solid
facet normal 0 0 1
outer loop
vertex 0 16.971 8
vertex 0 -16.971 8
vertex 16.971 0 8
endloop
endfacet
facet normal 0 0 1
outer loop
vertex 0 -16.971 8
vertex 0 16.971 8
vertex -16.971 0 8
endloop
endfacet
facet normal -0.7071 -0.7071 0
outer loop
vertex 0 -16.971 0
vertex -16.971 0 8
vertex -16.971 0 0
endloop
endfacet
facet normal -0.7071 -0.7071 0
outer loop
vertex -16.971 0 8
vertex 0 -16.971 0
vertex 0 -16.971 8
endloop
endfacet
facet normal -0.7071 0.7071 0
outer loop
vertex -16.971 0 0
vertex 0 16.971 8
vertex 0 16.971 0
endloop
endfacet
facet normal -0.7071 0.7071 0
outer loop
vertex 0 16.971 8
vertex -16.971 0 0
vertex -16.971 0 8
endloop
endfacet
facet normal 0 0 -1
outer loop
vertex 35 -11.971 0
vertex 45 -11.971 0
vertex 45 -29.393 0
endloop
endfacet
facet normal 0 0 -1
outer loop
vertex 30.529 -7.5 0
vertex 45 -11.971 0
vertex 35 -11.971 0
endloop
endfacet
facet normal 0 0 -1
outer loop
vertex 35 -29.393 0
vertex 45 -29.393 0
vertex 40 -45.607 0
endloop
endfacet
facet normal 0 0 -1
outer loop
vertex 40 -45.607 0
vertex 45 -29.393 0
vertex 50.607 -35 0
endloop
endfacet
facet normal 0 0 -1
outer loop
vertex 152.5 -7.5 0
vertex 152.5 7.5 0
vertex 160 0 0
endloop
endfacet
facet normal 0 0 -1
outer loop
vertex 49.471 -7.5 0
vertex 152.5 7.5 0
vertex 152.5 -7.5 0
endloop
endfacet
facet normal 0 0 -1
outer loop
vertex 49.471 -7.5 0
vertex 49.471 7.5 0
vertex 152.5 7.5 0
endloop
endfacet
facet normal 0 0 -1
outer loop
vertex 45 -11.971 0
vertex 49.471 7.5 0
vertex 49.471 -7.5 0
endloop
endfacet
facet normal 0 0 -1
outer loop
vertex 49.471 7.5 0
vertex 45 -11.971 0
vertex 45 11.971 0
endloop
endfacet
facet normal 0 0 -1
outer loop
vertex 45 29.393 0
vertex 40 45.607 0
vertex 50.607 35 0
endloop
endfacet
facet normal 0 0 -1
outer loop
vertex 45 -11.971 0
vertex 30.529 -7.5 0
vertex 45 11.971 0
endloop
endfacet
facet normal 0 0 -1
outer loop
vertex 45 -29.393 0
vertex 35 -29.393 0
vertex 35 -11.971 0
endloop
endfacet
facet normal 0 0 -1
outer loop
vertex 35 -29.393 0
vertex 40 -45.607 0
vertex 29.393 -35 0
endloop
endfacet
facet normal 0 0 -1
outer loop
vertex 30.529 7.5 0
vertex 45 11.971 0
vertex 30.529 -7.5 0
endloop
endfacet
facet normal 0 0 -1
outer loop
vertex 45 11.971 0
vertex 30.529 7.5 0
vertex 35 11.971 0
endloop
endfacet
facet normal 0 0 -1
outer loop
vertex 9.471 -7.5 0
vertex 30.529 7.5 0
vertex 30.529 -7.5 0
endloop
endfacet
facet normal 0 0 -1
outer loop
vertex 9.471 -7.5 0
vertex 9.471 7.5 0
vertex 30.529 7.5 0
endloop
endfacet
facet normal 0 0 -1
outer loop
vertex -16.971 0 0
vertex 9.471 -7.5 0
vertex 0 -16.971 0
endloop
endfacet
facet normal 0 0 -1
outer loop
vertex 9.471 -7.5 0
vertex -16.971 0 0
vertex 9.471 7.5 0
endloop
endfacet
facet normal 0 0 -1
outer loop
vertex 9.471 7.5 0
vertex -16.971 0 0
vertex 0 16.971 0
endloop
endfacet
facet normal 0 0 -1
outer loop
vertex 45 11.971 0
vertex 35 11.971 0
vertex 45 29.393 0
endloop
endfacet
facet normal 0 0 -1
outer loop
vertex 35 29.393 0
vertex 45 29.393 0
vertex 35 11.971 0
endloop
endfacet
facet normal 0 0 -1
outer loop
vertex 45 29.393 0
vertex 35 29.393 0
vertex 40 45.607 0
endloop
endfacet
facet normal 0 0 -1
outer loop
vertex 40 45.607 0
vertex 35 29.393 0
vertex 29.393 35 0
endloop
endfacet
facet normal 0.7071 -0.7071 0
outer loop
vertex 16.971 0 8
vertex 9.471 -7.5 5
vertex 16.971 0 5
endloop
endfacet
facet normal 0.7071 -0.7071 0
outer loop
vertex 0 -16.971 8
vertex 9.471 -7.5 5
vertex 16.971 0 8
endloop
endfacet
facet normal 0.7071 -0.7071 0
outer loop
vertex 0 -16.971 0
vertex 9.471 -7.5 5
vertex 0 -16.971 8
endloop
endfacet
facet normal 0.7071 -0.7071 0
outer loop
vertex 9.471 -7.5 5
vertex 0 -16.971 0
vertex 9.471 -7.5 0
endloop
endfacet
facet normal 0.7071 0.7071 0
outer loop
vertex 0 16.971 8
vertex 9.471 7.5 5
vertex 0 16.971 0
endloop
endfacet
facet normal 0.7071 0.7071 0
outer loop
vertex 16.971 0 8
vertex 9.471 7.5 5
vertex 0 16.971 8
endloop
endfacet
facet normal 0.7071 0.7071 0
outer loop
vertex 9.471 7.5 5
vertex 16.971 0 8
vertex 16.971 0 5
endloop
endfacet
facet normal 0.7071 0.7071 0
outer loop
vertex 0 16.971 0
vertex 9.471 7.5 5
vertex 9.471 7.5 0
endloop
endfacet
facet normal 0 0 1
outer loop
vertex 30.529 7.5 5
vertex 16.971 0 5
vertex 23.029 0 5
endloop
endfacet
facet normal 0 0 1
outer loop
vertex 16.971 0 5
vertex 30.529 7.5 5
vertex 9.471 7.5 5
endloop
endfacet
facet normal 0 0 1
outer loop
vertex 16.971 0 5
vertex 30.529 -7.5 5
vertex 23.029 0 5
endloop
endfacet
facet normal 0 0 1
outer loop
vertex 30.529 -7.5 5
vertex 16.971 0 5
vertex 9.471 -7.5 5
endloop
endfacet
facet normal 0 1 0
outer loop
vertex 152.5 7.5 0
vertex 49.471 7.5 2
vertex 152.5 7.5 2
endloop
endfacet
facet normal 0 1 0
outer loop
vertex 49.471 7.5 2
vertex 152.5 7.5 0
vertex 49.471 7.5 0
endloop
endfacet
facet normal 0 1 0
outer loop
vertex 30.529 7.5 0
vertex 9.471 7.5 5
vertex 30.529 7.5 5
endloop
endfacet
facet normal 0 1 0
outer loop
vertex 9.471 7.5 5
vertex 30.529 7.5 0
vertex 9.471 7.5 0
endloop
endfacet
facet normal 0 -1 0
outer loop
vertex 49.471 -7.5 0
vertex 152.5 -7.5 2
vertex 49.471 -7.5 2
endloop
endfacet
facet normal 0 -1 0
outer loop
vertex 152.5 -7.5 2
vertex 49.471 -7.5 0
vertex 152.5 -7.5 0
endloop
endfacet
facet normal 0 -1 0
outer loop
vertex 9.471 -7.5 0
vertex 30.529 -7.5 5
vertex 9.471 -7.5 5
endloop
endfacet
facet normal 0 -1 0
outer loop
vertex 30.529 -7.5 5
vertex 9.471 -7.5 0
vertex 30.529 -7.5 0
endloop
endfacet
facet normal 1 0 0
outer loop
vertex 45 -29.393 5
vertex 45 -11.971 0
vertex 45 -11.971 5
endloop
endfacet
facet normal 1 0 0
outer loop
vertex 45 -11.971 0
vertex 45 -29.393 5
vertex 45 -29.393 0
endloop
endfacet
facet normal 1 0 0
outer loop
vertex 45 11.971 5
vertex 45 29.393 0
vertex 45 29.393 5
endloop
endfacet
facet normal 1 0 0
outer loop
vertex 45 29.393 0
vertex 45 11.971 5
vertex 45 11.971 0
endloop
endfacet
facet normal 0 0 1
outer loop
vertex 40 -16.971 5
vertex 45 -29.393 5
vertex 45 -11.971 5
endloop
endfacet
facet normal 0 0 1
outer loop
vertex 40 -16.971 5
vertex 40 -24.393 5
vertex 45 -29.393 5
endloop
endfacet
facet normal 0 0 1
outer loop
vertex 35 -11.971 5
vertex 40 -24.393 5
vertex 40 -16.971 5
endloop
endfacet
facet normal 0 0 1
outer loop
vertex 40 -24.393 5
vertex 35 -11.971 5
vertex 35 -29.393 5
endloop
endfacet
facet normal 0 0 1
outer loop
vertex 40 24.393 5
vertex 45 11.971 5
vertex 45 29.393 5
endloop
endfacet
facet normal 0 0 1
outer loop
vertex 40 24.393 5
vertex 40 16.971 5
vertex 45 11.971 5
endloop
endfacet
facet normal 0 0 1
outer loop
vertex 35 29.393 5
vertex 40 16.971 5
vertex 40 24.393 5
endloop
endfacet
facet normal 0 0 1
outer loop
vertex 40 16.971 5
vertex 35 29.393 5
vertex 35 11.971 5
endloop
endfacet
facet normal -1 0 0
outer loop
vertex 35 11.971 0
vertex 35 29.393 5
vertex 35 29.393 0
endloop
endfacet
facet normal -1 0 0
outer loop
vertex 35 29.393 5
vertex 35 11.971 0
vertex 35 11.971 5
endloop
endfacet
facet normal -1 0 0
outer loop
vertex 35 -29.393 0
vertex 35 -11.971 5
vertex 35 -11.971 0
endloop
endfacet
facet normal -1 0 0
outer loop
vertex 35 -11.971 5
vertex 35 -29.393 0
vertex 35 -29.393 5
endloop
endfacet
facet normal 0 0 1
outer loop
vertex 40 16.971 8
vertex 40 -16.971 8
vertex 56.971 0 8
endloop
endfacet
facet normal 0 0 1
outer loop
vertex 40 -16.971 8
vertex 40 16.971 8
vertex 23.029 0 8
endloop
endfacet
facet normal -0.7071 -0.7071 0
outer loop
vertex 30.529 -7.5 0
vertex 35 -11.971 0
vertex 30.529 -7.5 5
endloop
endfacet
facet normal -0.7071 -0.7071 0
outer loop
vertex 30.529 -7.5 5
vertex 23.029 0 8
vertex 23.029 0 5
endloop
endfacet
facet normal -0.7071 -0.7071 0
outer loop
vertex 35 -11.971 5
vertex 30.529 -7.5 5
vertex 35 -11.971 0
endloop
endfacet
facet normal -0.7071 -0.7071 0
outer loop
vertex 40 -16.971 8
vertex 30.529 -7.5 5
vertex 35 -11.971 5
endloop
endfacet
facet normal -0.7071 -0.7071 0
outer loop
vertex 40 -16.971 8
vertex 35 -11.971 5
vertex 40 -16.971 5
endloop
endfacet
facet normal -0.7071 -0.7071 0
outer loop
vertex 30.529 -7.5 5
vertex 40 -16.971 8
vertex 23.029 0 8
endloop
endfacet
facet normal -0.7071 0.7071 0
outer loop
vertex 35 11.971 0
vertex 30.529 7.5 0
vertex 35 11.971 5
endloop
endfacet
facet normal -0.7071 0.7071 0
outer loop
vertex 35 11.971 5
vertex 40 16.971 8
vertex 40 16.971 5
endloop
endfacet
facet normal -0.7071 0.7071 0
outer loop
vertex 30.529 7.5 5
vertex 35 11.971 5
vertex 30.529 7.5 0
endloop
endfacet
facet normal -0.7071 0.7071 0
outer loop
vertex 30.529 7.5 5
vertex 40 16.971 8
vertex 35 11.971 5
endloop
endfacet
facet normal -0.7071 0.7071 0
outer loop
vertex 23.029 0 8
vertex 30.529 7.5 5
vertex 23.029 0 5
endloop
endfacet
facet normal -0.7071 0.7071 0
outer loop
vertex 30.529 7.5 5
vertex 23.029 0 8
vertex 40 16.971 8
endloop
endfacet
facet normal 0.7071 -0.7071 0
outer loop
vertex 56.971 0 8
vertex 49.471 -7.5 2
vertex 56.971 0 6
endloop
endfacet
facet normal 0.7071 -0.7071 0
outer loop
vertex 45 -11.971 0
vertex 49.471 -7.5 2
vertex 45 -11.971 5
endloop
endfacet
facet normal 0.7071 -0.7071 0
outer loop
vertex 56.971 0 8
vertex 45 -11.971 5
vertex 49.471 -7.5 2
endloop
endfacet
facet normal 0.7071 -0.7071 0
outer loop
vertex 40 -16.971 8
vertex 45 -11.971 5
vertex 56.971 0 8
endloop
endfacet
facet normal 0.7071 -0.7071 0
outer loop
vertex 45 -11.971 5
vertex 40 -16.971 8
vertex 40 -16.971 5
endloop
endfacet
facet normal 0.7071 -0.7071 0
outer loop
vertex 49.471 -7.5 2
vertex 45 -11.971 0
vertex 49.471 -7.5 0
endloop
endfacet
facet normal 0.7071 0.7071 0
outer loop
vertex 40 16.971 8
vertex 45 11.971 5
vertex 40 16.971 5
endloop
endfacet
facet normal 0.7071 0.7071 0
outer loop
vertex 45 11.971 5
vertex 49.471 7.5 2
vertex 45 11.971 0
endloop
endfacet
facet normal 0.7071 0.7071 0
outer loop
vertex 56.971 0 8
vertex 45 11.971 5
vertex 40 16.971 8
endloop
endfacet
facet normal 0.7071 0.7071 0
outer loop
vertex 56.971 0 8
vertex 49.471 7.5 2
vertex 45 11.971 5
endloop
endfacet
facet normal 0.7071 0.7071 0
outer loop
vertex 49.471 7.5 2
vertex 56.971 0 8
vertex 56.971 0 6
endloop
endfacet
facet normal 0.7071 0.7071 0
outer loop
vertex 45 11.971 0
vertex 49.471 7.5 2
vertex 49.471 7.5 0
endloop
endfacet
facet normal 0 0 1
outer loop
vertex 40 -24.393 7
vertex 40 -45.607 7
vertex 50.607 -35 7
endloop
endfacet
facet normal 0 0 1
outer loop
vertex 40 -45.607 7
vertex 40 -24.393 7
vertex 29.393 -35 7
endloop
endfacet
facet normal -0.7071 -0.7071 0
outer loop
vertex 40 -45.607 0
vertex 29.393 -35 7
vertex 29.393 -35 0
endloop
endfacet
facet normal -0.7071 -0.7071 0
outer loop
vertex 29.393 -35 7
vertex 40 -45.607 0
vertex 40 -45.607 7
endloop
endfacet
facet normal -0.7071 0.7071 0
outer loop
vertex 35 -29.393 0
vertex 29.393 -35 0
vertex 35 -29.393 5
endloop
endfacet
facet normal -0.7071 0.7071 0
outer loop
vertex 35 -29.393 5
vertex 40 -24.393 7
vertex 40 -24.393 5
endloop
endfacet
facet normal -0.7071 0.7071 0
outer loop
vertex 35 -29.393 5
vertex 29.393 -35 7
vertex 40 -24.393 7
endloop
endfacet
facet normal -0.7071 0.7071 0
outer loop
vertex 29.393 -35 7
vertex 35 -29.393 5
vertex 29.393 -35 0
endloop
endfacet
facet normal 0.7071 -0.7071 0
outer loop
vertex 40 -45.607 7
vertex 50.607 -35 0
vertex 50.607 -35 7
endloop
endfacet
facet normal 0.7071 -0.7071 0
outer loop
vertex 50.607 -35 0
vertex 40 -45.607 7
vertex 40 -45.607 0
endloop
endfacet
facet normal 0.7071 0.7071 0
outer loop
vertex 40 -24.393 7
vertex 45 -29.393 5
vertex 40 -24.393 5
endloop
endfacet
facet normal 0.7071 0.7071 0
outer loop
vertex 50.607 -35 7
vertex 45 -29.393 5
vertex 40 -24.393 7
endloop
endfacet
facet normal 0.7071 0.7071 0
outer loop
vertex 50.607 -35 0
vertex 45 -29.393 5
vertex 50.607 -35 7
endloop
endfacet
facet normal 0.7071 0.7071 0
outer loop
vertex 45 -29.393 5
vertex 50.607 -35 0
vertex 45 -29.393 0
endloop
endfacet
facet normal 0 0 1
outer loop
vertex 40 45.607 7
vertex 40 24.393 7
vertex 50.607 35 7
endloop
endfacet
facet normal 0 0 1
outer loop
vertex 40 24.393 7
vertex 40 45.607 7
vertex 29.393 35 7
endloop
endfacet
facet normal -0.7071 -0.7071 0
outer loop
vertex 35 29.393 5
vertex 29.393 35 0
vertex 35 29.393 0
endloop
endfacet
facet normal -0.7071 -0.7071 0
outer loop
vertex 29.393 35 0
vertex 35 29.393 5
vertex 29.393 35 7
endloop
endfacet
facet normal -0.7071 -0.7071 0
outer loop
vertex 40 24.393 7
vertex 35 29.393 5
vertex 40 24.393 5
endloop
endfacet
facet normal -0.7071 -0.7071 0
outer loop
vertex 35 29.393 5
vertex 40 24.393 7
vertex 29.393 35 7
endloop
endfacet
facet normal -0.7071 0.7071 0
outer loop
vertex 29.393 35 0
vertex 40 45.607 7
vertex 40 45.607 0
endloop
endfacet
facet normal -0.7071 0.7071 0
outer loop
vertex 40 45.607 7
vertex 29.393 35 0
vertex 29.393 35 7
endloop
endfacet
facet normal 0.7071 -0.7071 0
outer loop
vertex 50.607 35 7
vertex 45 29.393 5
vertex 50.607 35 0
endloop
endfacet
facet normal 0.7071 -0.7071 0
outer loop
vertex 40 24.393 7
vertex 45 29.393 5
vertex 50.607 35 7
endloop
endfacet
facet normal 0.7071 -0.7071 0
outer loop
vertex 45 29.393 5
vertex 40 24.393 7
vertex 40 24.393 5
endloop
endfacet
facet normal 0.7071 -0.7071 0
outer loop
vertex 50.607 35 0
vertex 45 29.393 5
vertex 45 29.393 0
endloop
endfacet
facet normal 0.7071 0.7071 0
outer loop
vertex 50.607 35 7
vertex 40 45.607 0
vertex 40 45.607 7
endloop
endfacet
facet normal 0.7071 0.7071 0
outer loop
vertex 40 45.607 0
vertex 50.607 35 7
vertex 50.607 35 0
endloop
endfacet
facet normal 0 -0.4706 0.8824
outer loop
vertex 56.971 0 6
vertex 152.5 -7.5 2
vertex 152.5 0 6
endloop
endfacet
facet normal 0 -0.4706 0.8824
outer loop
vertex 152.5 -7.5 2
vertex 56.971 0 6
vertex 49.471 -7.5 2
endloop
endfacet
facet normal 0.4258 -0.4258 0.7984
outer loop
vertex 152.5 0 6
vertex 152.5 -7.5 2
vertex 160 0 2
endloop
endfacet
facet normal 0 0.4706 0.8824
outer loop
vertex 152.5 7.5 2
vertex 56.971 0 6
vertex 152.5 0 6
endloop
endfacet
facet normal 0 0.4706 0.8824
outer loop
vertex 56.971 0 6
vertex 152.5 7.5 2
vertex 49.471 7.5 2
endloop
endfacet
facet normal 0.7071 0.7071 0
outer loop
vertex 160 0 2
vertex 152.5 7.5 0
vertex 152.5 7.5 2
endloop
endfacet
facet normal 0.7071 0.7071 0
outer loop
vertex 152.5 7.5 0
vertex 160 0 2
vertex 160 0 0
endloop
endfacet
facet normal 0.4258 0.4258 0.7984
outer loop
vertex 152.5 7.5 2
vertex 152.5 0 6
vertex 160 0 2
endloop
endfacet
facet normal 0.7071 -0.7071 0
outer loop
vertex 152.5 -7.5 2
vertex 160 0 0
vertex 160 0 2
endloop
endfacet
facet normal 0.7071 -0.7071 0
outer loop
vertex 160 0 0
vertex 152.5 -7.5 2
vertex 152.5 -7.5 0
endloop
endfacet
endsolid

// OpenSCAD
large_decoration_height = 8; //[0:30]
small_decoration_height = 7; //[0:30]
large_decoration_width = 24; //[10:40]
small_decoration_width = 15; //[7:35]
handle_width = 15; //[5:25]
hilt_width = 10; //[5:25]
hilt_length = 70; //[30:130]
handle_height = 5; //[0:30]
blade_length = 120; //[20:250]
blade_side_height = 2; //[0:30]
blade_center_height = 6; //[0:30]

// preview[view:south west, tilt:top diagonal]

//bottom
	rotate([0,0,45])
	translate([-large_decoration_width/2,-large_decoration_width/2,0])
	cube(size=[large_decoration_width,large_decoration_width,large_decoration_height]);

//handle
translate([0,-handle_width/2,0])
cube(size = [40,handle_width,handle_height]);

//hilt
translate([40 - hilt_width/2,-hilt_length/2,0])
cube(size = [hilt_width,hilt_length,handle_height]);

//where the two parts of the handle intersect
translate([40,0,0])
	rotate([0,0,45])
	translate([-large_decoration_width/2,-large_decoration_width/2,0])
	cube(size=[large_decoration_width,large_decoration_width,large_decoration_height]);

//right of hilt
translate([40,-hilt_length/2,0])
	rotate([0,0,45])
	translate([-small_decoration_width/2,-small_decoration_width/2,0])
	cube(size=[small_decoration_width,small_decoration_width,small_decoration_height]);

//left of hilt
translate([40,hilt_length/2,0])
	rotate([0,0,45])
	translate([-small_decoration_width/2,-small_decoration_width/2,0])
	cube(size=[small_decoration_width,small_decoration_width,small_decoration_height]);

//blade
translate([40,0,0])
polyhedron(
	points=[
			//bottom
			[0,-7.5,0], //0
			[blade_length-7.5,-7.5,0], //1
			[blade_length-7.5,7.5,0], //2
			[0,7.5,0], //3
			[blade_length,0,0], //4
			//middle
			[0,-7.5,blade_side_height], //5
			[blade_length-7.5,-7.5,blade_side_height], //6
			[blade_length-7.5,7.5,blade_side_height], //7
			[0,7.5,blade_side_height], //8
			[blade_length,0,blade_side_height], //9
			//top
			[0,0,blade_center_height], //10
			[blade_length-7.5,0,blade_center_height] //11
			],
	triangles=[
			//~-~bottom~-~
			[0,1,2],
			[0,2,3],
			//bottom point
			[1,4,2],
			//~-~walls~-~
			//right
			[0,5,1],
			[5,6,1],
			//right point
			[1,6,4],
			[4,6,9],
			//left
			[8,3,2],
			[7,8,2],
			//left point
			[7,2,4],
			[7,4,9],
			//back
			[0,3,5],
			[5,3,8],
			//~-~top~-~
			//right
			[10,6,5],
			[11,6,10],
			//right point
			[11,9,6],
			//left
			[10,8,7],
			[7,11,10],
			//left point
			[11,7,9],
			//back
			[10,5,8]
			]
	
);
